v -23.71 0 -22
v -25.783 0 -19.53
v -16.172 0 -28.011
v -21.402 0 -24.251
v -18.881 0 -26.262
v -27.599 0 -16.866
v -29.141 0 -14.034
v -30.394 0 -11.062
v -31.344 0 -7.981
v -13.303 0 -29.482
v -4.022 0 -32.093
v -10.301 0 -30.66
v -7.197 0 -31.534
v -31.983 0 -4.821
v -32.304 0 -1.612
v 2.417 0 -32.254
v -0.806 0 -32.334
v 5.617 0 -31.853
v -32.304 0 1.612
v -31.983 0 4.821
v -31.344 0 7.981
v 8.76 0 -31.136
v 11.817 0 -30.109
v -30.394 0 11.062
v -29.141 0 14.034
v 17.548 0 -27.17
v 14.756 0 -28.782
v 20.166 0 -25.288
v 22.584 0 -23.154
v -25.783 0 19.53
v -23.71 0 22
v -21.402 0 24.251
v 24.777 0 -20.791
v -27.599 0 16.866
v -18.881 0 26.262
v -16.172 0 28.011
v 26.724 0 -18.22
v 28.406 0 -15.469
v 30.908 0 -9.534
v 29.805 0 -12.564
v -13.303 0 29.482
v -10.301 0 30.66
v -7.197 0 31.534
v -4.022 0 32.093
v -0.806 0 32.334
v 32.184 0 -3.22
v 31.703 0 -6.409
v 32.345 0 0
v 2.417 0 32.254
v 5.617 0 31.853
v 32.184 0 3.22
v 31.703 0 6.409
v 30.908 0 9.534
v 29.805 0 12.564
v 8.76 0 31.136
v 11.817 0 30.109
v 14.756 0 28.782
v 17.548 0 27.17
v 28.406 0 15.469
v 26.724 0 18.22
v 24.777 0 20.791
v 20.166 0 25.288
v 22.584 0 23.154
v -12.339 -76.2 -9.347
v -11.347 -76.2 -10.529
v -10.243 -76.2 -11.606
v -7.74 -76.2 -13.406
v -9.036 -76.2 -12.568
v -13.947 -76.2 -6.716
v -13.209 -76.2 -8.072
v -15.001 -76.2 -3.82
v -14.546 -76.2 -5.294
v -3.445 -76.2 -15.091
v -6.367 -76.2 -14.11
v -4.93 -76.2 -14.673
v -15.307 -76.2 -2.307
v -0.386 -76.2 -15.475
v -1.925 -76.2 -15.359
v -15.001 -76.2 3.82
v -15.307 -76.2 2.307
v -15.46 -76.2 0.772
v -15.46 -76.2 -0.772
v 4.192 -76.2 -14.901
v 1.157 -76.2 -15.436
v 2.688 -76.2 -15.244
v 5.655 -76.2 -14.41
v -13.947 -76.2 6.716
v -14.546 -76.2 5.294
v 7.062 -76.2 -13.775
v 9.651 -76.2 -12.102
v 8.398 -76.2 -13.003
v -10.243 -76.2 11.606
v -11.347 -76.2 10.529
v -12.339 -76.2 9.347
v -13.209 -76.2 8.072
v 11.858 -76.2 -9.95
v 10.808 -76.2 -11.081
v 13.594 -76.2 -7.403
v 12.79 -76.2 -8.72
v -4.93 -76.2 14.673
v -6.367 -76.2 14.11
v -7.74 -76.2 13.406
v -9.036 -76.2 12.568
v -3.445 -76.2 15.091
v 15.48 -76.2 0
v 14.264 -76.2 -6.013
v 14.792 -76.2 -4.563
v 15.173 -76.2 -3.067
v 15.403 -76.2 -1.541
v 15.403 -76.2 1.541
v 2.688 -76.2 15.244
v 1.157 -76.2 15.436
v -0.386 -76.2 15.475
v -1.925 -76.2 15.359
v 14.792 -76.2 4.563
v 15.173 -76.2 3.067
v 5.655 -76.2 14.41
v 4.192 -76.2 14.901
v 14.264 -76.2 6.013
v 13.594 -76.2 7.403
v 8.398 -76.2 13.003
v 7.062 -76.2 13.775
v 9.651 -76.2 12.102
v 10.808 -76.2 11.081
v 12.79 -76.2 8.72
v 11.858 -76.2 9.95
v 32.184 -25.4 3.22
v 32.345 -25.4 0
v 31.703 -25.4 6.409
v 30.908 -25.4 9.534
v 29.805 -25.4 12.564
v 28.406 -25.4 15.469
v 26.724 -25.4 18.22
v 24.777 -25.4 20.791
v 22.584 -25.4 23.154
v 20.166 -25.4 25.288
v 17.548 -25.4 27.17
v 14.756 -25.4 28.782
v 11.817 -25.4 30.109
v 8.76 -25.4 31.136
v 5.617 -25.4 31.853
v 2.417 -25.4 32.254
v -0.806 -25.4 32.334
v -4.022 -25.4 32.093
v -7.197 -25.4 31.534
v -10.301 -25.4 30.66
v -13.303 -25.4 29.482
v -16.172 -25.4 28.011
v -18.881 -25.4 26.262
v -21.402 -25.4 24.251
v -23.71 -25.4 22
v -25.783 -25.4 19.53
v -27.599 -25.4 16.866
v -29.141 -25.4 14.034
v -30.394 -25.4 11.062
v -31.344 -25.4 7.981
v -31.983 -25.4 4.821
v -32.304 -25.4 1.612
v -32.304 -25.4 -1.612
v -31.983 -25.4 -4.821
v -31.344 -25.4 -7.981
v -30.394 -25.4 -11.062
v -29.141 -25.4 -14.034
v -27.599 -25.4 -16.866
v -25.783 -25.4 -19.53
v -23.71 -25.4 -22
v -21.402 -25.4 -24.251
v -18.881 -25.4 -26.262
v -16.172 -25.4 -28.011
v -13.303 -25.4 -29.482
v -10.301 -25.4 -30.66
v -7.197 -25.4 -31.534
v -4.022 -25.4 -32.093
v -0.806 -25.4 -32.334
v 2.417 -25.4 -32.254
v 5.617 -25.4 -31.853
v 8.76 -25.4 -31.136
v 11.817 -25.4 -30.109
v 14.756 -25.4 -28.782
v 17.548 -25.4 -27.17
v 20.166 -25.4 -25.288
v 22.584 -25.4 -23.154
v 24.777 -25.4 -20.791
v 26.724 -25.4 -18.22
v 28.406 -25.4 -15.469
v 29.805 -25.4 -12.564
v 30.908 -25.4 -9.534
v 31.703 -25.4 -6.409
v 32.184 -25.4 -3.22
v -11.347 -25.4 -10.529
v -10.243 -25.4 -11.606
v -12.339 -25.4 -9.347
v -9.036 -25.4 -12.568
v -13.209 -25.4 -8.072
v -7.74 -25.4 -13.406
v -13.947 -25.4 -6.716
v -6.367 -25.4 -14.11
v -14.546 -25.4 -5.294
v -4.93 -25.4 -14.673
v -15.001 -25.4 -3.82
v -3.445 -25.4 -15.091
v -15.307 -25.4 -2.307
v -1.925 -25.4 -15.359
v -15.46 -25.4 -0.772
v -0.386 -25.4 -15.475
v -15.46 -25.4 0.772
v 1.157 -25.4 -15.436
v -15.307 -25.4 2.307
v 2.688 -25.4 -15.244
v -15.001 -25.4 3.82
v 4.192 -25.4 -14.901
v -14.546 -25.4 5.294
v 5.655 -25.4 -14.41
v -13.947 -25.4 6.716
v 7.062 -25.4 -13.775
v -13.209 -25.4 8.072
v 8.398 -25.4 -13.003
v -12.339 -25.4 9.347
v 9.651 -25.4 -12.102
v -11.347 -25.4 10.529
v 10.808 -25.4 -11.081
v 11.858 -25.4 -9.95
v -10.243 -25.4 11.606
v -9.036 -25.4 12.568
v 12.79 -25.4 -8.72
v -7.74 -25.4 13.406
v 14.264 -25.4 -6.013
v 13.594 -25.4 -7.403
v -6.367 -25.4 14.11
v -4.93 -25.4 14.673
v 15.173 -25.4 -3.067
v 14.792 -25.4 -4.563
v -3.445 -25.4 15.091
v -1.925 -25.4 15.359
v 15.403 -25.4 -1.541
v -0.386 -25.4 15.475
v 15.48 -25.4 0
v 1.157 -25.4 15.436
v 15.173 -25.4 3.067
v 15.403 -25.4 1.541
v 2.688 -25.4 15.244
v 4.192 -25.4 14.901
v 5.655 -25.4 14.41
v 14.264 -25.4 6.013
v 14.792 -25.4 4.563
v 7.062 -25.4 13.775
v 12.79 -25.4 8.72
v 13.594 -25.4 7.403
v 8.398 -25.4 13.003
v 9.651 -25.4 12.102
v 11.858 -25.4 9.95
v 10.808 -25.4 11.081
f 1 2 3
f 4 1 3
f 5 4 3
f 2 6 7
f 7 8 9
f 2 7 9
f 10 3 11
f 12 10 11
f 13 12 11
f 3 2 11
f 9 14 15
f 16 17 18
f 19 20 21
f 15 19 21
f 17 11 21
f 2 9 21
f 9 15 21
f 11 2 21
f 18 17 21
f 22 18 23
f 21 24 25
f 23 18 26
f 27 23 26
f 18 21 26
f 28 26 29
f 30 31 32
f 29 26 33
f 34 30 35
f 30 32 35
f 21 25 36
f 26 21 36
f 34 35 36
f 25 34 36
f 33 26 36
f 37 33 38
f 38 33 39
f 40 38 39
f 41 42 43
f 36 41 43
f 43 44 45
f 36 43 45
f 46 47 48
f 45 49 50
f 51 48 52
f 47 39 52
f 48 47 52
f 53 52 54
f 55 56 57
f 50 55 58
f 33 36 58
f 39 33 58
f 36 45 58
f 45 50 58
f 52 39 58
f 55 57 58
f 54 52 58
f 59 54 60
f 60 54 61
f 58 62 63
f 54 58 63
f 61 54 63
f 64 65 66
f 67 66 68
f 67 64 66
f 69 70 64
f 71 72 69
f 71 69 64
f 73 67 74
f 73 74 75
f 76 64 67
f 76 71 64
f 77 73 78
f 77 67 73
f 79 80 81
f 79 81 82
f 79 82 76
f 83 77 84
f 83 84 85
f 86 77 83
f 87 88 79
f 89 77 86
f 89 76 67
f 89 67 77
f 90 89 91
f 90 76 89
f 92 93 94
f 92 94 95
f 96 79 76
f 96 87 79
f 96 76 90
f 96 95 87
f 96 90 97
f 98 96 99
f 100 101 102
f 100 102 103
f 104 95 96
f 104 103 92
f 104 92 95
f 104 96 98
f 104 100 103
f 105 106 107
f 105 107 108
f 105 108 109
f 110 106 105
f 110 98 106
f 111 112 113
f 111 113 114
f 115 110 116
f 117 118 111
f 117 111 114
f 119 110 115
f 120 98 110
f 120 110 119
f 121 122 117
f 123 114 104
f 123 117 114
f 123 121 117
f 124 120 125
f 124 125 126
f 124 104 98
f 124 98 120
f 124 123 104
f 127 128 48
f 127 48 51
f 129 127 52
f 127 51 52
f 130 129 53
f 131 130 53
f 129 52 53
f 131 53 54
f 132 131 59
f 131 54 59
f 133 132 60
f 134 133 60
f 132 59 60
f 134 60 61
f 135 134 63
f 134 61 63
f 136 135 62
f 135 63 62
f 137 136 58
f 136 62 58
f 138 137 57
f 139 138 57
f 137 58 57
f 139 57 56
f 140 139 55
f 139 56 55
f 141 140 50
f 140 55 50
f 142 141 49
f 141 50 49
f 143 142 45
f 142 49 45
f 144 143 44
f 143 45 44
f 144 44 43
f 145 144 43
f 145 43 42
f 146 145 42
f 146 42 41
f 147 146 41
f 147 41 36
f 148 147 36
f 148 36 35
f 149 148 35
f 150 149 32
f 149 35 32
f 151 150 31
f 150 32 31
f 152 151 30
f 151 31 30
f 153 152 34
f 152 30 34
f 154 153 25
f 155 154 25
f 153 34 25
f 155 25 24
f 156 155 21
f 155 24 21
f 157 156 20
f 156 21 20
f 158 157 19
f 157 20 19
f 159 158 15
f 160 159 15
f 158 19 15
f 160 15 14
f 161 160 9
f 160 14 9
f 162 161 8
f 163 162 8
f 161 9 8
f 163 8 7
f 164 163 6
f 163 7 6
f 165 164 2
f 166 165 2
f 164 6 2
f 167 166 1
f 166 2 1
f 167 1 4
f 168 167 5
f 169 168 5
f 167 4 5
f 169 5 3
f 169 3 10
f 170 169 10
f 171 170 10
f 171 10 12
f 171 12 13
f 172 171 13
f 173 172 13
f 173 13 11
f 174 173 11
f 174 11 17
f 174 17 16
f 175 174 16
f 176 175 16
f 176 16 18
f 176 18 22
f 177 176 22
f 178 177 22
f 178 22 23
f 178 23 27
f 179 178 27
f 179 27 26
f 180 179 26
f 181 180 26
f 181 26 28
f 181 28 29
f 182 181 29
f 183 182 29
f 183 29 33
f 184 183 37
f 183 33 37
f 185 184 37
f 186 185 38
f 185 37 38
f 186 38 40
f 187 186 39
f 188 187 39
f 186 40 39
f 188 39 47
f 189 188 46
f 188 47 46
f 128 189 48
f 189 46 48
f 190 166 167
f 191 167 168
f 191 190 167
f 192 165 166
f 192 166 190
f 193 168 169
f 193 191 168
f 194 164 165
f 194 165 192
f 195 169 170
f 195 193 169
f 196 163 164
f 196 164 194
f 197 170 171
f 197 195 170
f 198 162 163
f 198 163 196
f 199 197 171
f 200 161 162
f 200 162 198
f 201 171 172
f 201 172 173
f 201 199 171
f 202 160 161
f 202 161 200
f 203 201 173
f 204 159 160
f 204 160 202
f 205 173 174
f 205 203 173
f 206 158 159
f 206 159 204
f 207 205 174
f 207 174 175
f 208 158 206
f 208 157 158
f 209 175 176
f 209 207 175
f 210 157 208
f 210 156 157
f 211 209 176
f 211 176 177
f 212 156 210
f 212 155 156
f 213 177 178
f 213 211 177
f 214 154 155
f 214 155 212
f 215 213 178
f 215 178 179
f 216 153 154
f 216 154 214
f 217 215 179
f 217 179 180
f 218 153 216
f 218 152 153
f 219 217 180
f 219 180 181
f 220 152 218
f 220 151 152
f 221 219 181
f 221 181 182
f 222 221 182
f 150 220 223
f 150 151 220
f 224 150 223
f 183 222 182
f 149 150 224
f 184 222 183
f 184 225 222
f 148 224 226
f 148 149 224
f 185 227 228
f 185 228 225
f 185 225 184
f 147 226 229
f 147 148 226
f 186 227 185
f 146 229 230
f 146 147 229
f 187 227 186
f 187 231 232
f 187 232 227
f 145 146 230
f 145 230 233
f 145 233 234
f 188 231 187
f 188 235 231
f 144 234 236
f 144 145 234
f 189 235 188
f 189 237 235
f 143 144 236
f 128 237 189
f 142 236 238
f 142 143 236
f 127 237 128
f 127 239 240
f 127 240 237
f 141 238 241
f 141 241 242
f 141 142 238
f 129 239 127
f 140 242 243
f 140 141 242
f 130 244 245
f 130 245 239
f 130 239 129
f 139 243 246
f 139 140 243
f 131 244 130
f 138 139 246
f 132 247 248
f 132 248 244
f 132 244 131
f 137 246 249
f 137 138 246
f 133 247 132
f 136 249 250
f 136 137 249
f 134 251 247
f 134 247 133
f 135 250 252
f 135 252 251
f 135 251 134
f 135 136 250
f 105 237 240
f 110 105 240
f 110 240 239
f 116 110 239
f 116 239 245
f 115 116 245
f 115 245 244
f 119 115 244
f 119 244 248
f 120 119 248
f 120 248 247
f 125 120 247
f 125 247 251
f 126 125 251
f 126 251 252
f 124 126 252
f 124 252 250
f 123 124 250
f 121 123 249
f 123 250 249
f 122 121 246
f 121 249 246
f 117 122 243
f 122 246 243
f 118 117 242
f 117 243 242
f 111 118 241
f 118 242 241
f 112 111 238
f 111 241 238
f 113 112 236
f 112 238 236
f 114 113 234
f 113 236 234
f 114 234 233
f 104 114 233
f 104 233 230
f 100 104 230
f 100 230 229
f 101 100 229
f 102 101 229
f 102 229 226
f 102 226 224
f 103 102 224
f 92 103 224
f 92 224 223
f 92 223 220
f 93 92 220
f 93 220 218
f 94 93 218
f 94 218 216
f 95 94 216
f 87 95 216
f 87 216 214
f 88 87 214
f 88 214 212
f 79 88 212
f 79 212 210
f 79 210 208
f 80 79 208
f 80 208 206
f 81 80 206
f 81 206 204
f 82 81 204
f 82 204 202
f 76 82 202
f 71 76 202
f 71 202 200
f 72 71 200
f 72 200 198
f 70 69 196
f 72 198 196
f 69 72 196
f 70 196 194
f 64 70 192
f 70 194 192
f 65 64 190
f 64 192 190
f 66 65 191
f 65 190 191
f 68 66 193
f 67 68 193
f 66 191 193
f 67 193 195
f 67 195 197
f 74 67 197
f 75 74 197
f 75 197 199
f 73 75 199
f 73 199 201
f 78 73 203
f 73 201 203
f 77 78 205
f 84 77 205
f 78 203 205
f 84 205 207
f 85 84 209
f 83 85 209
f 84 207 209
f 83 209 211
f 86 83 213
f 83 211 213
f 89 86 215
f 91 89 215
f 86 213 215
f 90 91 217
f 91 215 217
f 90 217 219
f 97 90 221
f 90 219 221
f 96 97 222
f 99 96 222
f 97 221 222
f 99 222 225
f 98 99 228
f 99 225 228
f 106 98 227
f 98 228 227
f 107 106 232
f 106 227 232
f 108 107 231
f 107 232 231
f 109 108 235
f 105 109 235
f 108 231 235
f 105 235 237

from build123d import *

# Parameters (mm, degrees)
F0_R     = 32.34451
F1_DEPTH = 25.4
F2_R     = 15.47955
F3_DEPTH = 76.2
F4_R     = 8.094694
F5_DEPTH = 25.4


with BuildPart() as f1:
    # F0 (on Front) → F1 (new body)
    with BuildSketch(Plane.XZ):
        Circle(F0_R)
    extrude(amount=F1_DEPTH)

    # F2 (on Front) → F3 (join)
    with BuildSketch(Plane.XZ):
        Circle(F2_R)
    extrude(amount=F3_DEPTH)

    # F4 (on Front) → F5 (cut)
    with BuildSketch(Plane.XZ):
        Circle(F4_R)
    extrude(amount=-F5_DEPTH, mode=Mode.SUBTRACT)


solid = f1.part
